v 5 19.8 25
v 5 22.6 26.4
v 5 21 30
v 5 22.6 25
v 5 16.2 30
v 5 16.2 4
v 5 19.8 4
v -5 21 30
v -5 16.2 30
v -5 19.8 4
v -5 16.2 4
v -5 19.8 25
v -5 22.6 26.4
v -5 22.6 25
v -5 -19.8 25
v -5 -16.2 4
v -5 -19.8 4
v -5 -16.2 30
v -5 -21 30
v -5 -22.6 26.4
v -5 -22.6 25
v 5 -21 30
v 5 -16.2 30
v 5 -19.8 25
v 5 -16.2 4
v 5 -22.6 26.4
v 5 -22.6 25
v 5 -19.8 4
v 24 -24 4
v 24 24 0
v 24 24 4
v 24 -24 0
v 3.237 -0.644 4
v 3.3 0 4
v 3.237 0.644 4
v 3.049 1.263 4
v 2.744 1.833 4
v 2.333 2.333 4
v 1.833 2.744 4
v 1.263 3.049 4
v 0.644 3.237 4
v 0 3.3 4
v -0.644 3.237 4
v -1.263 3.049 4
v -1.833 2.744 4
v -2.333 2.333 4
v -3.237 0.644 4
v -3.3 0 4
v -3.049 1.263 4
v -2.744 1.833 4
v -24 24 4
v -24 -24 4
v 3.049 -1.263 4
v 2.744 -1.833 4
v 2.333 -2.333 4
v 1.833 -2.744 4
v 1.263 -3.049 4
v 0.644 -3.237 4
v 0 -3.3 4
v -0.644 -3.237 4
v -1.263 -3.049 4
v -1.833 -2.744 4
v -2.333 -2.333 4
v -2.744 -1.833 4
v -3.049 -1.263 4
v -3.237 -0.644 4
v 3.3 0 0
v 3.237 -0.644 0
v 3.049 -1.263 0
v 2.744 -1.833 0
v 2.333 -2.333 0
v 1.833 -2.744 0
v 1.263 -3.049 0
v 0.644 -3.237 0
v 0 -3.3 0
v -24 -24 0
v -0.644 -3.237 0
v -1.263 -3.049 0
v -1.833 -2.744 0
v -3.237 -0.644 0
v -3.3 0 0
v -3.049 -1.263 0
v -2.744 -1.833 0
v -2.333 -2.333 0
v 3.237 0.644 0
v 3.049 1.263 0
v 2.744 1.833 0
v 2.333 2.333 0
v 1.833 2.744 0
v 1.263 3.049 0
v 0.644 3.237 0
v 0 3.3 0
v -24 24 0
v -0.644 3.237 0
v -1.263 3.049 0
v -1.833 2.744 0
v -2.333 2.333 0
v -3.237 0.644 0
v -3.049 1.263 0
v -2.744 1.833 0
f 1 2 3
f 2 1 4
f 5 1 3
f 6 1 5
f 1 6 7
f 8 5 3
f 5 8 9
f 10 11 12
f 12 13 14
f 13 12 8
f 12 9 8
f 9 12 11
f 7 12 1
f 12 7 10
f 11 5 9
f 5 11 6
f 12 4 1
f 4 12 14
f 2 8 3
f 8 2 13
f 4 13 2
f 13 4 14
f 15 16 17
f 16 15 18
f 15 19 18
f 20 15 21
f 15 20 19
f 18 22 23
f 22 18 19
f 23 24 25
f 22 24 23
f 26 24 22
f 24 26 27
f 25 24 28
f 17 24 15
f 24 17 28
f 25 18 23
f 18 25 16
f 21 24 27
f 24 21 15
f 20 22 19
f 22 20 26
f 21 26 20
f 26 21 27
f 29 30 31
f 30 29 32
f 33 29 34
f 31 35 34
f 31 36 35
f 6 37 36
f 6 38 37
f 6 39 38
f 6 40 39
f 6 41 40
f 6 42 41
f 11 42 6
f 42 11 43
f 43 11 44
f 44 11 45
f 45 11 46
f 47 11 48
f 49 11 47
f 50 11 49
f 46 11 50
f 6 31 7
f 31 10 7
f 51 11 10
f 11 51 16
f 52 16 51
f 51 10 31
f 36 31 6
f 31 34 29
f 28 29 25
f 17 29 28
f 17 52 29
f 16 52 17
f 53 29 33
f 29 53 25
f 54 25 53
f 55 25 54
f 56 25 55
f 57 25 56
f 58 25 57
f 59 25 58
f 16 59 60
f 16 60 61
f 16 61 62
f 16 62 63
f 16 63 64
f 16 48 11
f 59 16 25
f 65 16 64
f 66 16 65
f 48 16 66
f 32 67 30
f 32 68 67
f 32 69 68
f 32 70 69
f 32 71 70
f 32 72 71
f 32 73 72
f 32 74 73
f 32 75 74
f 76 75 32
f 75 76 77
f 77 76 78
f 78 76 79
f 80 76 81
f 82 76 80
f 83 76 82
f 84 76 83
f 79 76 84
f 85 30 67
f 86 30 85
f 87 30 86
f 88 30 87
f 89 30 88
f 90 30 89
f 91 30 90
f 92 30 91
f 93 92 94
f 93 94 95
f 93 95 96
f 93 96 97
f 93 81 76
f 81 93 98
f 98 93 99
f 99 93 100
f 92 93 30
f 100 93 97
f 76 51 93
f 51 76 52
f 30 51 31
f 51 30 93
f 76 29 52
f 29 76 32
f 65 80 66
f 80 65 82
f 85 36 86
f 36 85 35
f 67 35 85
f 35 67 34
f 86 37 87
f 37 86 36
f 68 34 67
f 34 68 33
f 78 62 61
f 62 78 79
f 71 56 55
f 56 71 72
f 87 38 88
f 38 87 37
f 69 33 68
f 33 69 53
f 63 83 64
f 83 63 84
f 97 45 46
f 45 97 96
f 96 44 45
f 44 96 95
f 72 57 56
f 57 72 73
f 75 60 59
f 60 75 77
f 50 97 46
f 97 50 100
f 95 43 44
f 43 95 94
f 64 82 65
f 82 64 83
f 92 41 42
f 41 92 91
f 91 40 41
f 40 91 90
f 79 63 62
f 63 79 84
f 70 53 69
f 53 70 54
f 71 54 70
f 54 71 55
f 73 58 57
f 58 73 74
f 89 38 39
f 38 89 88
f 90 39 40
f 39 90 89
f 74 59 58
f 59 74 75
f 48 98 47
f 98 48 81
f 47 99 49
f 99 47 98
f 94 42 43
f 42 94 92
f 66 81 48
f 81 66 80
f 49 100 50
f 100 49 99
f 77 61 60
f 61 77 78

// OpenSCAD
$fn = 32;

// ----------------------------------------------------------------------
// Snap-fit latch: 2 arms, 26 mm tall, 3 mm undercut hooks
// ----------------------------------------------------------------------

// --- parameters (mm) ---
base_d = 48;              // base plate depth
base_h = 4;               // base plate thickness
span = 36;                // distance between opposite arms
arm_t = 3.6;              // arm thickness
arm_d = 10;               // arm width
height = 26;              // free arm length
head_len = 3;             // hook reach
head_h = 5;               // hook height
lead = 1.4;               // lead-in ramp thickness
bore_d = 6.6;             // base fixing bore
top_z = 30;               // height of the arm tips above the base

arms = 2;

difference() {
  union() {
    /* base plate, centred on the arm ring */
    translate([-24, -24, 0]) cube([base_d, base_d, base_h]);
    for (a = [0 : 360 / arms : 359]) rotate([0, 0, a]) {
    /* arm, sunk 0.5 mm into the base */
    translate([-arm_d / 2, span / 2 - arm_t / 2, base_h - 0.5]) cube([arm_d, arm_t, height + 0.5]);
    /* hook: a convex hull of a tall inner block and a thin outer lip
       gives a flat undercut below and a lead-in ramp on top */
    hull() {
      translate([-arm_d / 2, span / 2 + arm_t / 2 - 0.6, top_z - head_h]) cube([arm_d, lead + 0.4, head_h]);
      translate([-arm_d / 2, span / 2 + arm_t / 2 - 0.2, top_z - head_h]) cube([arm_d, head_len, lead]);
    }
    }
  }
  translate([0, 0, -2.5]) cylinder(h = base_h + 5, d = bore_d);
}
